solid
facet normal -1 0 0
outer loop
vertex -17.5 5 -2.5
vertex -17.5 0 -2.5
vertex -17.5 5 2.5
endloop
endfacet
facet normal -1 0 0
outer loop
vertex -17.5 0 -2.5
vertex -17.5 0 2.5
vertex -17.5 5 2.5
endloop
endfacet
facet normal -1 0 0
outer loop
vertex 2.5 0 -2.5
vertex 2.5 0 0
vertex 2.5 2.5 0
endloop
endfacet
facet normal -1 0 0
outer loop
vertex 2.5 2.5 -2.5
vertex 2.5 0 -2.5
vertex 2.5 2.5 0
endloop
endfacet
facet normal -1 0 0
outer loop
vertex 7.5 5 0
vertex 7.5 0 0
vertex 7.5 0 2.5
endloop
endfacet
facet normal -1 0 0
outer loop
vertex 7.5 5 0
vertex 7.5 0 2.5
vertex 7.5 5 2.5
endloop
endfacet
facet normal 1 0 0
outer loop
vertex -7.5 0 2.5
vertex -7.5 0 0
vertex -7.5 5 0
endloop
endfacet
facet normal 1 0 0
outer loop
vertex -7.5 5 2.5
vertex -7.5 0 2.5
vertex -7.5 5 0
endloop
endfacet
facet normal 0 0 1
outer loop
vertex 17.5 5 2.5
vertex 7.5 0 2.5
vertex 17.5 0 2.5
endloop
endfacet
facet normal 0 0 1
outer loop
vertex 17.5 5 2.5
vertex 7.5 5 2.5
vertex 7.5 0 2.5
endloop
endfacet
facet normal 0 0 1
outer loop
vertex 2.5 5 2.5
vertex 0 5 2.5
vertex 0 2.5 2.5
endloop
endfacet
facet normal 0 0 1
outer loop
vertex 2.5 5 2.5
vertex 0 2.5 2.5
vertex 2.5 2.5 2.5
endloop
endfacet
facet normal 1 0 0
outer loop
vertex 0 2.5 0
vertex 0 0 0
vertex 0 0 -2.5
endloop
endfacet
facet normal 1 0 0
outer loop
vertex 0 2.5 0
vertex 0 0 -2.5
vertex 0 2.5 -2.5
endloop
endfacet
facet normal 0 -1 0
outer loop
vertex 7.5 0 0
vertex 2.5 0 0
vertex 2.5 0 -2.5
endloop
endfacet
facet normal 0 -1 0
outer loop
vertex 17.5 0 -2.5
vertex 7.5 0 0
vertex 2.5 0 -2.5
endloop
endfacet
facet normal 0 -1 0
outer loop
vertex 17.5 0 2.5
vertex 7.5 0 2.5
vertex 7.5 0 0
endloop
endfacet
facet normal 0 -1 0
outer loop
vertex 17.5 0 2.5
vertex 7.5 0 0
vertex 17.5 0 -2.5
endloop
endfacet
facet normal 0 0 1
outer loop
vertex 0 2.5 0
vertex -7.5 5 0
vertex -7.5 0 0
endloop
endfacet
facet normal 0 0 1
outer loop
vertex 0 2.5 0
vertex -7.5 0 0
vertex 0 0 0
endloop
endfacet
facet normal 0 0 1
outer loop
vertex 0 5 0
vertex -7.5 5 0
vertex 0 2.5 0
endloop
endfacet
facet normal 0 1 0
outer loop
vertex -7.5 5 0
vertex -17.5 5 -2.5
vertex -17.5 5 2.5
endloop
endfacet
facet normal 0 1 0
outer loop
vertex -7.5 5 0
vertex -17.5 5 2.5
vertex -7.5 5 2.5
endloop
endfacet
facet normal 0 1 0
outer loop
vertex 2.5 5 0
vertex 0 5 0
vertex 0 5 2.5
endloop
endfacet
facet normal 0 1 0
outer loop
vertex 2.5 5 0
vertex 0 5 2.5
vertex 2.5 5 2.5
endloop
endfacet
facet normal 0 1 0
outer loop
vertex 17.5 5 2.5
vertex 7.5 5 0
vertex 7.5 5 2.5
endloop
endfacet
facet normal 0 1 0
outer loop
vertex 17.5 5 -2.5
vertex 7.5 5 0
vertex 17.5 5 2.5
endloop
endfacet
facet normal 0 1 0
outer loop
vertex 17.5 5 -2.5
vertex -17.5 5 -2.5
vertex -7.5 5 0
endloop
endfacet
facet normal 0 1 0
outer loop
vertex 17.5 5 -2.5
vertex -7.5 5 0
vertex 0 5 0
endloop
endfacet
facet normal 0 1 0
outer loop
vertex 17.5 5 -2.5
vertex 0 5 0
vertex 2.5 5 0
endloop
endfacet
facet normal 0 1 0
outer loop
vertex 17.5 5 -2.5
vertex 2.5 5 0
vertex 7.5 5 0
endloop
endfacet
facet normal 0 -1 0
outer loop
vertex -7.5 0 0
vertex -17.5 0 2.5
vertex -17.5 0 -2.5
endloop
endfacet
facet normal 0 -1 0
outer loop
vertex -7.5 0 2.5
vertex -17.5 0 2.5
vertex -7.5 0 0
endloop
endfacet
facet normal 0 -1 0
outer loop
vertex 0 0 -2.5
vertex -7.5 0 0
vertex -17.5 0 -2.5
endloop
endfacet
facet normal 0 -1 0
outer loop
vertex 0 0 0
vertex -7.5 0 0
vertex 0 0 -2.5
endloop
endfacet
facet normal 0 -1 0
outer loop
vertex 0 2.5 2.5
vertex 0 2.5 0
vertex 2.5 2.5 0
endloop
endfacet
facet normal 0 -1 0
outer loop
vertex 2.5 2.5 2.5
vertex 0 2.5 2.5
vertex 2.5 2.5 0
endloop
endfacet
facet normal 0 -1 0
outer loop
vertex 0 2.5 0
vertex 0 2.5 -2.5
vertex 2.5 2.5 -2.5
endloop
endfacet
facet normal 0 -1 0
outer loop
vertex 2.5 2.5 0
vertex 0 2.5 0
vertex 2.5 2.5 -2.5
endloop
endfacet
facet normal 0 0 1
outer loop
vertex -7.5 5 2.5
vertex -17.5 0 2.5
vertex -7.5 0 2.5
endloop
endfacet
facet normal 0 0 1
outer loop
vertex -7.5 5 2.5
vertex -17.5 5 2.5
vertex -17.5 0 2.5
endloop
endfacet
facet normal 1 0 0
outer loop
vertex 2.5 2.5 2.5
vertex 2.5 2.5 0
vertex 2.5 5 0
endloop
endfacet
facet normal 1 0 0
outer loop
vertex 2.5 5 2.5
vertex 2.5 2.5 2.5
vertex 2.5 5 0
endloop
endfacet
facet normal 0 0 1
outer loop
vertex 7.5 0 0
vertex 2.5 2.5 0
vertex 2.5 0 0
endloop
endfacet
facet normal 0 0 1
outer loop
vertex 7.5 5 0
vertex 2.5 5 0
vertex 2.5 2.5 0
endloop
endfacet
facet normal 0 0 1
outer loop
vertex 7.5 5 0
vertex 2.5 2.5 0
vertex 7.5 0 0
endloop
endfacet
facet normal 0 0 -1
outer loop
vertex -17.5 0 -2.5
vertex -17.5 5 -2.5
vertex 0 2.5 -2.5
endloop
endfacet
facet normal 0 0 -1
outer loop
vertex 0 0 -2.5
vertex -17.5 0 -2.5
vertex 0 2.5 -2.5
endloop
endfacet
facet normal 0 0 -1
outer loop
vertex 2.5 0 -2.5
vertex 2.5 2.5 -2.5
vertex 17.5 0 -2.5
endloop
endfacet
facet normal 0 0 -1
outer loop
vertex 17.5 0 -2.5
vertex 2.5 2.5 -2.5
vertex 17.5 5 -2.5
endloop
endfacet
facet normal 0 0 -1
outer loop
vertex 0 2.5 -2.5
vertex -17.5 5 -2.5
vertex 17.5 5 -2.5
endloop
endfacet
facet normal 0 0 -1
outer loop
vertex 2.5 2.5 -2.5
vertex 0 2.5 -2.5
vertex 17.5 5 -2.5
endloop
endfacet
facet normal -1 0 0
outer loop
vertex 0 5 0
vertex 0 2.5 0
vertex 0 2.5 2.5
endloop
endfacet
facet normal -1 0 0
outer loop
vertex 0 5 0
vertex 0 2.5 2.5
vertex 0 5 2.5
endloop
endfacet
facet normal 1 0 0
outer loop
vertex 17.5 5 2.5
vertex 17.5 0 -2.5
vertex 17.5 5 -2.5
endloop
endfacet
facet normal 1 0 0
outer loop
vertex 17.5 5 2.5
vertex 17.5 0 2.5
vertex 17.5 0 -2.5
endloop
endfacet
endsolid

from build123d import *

# Parameters (mm, degrees)
F0_W     = 17.5
F0_H     = 5
F1_DEPTH = 2.5
F2_W     = 7.5
F2_H     = 5
F3_DEPTH = 2.5
F4_W     = 2.5
F4_H     = 2.5
F5_DEPTH = 2.5
F6_W     = 2.5
F6_H     = 2.5
F7_DEPTH = 2.5


with BuildPart() as f1:
    # F0 (on Top) → F1 (new body, symmetric)
    with BuildSketch(Plane.XY):
        with Locations((8.75, 2.5)):
            Rectangle(F0_W, F0_H)
        with Locations((-8.75, 2.5)):
            Rectangle(F0_W, F0_H)
    extrude(amount=F1_DEPTH, both=True)

    # F2 (on Top) → F3 (cut)
    with BuildSketch(Plane.XY):
        with Locations((3.75, 2.5)):
            Rectangle(F2_W, F2_H)
        with Locations((-3.75, 2.5)):
            Rectangle(F2_W, F2_H)
    extrude(amount=F3_DEPTH, mode=Mode.SUBTRACT)

    # F4 (on Right) → F5 (cut)
    with BuildSketch(Plane.YZ):
        with Locations((1.25, -1.25)):
            Rectangle(F4_W, F4_H)
    extrude(amount=F5_DEPTH, mode=Mode.SUBTRACT)

    # F6 (on Top) → F7 (join)
    with BuildSketch(Plane.XY):
        with Locations((1.25, 3.75)):
            Rectangle(F6_W, F6_H)
    extrude(amount=F7_DEPTH)


solid = f1.part
